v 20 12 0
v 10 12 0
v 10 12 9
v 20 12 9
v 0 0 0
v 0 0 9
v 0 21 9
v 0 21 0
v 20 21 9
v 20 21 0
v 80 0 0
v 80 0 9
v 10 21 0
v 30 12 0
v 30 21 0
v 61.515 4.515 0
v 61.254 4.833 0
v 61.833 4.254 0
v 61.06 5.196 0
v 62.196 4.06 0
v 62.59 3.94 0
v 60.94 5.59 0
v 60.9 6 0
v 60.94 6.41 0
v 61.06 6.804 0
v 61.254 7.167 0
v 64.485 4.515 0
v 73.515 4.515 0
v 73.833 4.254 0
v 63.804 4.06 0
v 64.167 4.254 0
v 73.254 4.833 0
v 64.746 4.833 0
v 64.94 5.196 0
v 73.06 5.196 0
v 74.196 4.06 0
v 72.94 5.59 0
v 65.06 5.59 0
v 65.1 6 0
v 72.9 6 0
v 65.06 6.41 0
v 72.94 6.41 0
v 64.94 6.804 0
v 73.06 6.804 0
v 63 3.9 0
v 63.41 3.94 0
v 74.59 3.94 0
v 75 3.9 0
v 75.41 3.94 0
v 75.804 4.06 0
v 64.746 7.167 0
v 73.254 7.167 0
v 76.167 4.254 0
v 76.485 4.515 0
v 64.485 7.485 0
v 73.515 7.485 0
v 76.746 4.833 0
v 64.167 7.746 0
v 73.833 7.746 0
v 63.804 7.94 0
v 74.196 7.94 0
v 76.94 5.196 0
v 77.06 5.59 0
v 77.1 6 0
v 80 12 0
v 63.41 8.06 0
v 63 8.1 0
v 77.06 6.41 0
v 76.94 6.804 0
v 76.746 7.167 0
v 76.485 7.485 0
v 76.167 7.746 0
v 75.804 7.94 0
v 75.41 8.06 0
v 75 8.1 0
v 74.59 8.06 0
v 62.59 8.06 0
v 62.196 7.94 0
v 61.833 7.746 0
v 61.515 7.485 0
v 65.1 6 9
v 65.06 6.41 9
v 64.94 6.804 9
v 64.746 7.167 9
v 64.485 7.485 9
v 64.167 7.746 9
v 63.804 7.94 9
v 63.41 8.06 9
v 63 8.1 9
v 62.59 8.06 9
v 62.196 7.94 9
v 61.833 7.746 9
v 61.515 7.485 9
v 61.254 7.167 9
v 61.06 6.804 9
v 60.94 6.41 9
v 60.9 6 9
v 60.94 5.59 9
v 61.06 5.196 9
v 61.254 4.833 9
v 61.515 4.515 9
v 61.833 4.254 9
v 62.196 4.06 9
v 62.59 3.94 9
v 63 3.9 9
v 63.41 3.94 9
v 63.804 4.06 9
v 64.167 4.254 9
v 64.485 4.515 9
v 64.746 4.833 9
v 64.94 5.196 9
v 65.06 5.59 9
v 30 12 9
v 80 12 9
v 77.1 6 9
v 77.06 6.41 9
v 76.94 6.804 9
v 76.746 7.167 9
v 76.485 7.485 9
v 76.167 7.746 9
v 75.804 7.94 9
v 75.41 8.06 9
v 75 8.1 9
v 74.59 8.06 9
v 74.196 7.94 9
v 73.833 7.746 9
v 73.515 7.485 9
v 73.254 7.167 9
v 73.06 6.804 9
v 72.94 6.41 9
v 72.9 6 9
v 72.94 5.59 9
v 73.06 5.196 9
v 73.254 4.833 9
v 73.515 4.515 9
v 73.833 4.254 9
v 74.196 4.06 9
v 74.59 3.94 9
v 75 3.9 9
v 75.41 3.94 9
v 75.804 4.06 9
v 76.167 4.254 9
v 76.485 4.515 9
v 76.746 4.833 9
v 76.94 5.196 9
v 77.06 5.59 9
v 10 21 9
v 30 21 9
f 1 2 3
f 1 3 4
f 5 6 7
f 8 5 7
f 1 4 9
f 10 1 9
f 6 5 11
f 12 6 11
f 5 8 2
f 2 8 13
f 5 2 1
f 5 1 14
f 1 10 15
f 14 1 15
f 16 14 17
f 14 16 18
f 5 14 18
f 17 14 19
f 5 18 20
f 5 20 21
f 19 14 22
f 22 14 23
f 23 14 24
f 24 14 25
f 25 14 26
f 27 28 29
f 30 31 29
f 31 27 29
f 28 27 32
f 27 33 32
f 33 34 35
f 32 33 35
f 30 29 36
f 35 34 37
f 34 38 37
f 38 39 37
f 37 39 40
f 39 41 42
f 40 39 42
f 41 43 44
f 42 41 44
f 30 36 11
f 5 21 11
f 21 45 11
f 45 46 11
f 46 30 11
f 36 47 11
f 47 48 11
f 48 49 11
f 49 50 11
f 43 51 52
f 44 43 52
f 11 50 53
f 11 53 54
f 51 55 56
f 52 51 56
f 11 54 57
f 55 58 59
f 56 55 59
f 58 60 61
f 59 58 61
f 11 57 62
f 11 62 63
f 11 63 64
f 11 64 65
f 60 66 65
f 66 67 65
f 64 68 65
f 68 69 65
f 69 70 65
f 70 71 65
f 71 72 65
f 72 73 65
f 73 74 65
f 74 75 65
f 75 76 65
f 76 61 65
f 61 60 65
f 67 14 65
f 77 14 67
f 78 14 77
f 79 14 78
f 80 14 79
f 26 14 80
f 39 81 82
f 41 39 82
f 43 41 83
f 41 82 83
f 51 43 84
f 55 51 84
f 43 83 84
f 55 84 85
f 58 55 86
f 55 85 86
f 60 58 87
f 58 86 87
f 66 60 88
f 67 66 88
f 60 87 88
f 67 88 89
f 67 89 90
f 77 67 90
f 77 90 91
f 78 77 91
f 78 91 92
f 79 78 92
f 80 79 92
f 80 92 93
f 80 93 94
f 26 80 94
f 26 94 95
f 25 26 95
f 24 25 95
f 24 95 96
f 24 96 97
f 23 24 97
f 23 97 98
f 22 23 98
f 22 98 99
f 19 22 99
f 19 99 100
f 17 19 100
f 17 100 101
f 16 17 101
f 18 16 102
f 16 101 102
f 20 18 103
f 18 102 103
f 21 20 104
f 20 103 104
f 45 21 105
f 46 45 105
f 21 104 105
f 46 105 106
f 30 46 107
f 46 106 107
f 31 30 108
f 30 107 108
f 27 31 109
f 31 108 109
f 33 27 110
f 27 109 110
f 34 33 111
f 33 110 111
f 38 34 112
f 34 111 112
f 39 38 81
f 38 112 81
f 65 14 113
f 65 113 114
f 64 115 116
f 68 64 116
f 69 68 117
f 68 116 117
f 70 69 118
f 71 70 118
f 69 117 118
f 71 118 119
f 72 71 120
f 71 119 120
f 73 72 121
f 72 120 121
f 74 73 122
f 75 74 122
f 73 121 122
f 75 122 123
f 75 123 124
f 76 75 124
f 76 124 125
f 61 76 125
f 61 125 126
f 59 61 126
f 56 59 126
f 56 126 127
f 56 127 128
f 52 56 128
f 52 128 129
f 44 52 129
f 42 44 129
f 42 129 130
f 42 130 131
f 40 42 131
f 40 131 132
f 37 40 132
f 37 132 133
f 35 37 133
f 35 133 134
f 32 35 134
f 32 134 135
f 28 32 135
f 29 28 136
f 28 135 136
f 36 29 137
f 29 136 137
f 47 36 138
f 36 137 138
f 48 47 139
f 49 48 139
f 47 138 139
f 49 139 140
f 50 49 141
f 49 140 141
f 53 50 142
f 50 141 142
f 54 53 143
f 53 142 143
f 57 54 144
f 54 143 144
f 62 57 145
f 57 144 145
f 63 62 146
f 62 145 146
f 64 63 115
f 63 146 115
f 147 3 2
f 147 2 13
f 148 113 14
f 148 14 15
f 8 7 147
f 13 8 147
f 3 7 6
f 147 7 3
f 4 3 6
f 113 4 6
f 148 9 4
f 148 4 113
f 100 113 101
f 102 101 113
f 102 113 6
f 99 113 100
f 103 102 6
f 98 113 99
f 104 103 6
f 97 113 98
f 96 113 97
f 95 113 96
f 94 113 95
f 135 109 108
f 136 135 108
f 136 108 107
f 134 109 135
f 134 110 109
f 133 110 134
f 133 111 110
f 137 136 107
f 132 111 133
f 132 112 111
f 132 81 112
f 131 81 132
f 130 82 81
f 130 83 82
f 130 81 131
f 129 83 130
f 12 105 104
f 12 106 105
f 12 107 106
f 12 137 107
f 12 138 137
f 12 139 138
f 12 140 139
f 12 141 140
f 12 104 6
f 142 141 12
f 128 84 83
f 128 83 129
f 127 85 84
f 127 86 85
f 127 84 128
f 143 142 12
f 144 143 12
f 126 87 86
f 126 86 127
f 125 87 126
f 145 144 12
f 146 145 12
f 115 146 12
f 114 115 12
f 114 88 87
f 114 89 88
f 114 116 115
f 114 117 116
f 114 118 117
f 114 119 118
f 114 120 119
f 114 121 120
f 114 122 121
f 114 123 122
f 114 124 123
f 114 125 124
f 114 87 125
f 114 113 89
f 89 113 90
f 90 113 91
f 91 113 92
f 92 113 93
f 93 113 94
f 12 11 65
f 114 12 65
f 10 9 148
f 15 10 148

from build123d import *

# Parameters (mm, degrees)
ESQUISSE1_W             = 80
ESQUISSE1_H             = 12
BOSS_EXTRU_1_DEPTH      = 9
ESQUISSE2_W             = 10
ESQUISSE2_H             = 9
BOSS_EXTRU_2_DEPTH      = 9
ESQUISSE3_R             = 2.1
ENL_V_MAT_EXTRU_1_DEPTH = 84.19855768


with BuildPart() as part:
    # Esquisse1 → Boss.-Extru.1 (new body)
    with BuildSketch(Plane.XY):
        with Locations((40, 6)):
            Rectangle(ESQUISSE1_W, ESQUISSE1_H)
    extrude(amount=BOSS_EXTRU_1_DEPTH)

    # Esquisse2 → Boss.-Extru.2 (add)
    with BuildSketch(Plane.XY.offset(9)):
        with Locations((5, 16.5)):
            Rectangle(ESQUISSE2_W, ESQUISSE2_H)
        with Locations((25, 16.5)):
            Rectangle(ESQUISSE2_W, ESQUISSE2_H)
    extrude(amount=-BOSS_EXTRU_2_DEPTH)

    # Esquisse3 → Enlèv. mat.-Extru.1 (cut, through all)
    with BuildSketch(Plane.XY.offset(9)):
        with Locations((63, 6)):
            Circle(ESQUISSE3_R)
        with Locations((75, 6)):
            Circle(ESQUISSE3_R)
    extrude(amount=-ENL_V_MAT_EXTRU_1_DEPTH, mode=Mode.SUBTRACT)


solid = part.part
